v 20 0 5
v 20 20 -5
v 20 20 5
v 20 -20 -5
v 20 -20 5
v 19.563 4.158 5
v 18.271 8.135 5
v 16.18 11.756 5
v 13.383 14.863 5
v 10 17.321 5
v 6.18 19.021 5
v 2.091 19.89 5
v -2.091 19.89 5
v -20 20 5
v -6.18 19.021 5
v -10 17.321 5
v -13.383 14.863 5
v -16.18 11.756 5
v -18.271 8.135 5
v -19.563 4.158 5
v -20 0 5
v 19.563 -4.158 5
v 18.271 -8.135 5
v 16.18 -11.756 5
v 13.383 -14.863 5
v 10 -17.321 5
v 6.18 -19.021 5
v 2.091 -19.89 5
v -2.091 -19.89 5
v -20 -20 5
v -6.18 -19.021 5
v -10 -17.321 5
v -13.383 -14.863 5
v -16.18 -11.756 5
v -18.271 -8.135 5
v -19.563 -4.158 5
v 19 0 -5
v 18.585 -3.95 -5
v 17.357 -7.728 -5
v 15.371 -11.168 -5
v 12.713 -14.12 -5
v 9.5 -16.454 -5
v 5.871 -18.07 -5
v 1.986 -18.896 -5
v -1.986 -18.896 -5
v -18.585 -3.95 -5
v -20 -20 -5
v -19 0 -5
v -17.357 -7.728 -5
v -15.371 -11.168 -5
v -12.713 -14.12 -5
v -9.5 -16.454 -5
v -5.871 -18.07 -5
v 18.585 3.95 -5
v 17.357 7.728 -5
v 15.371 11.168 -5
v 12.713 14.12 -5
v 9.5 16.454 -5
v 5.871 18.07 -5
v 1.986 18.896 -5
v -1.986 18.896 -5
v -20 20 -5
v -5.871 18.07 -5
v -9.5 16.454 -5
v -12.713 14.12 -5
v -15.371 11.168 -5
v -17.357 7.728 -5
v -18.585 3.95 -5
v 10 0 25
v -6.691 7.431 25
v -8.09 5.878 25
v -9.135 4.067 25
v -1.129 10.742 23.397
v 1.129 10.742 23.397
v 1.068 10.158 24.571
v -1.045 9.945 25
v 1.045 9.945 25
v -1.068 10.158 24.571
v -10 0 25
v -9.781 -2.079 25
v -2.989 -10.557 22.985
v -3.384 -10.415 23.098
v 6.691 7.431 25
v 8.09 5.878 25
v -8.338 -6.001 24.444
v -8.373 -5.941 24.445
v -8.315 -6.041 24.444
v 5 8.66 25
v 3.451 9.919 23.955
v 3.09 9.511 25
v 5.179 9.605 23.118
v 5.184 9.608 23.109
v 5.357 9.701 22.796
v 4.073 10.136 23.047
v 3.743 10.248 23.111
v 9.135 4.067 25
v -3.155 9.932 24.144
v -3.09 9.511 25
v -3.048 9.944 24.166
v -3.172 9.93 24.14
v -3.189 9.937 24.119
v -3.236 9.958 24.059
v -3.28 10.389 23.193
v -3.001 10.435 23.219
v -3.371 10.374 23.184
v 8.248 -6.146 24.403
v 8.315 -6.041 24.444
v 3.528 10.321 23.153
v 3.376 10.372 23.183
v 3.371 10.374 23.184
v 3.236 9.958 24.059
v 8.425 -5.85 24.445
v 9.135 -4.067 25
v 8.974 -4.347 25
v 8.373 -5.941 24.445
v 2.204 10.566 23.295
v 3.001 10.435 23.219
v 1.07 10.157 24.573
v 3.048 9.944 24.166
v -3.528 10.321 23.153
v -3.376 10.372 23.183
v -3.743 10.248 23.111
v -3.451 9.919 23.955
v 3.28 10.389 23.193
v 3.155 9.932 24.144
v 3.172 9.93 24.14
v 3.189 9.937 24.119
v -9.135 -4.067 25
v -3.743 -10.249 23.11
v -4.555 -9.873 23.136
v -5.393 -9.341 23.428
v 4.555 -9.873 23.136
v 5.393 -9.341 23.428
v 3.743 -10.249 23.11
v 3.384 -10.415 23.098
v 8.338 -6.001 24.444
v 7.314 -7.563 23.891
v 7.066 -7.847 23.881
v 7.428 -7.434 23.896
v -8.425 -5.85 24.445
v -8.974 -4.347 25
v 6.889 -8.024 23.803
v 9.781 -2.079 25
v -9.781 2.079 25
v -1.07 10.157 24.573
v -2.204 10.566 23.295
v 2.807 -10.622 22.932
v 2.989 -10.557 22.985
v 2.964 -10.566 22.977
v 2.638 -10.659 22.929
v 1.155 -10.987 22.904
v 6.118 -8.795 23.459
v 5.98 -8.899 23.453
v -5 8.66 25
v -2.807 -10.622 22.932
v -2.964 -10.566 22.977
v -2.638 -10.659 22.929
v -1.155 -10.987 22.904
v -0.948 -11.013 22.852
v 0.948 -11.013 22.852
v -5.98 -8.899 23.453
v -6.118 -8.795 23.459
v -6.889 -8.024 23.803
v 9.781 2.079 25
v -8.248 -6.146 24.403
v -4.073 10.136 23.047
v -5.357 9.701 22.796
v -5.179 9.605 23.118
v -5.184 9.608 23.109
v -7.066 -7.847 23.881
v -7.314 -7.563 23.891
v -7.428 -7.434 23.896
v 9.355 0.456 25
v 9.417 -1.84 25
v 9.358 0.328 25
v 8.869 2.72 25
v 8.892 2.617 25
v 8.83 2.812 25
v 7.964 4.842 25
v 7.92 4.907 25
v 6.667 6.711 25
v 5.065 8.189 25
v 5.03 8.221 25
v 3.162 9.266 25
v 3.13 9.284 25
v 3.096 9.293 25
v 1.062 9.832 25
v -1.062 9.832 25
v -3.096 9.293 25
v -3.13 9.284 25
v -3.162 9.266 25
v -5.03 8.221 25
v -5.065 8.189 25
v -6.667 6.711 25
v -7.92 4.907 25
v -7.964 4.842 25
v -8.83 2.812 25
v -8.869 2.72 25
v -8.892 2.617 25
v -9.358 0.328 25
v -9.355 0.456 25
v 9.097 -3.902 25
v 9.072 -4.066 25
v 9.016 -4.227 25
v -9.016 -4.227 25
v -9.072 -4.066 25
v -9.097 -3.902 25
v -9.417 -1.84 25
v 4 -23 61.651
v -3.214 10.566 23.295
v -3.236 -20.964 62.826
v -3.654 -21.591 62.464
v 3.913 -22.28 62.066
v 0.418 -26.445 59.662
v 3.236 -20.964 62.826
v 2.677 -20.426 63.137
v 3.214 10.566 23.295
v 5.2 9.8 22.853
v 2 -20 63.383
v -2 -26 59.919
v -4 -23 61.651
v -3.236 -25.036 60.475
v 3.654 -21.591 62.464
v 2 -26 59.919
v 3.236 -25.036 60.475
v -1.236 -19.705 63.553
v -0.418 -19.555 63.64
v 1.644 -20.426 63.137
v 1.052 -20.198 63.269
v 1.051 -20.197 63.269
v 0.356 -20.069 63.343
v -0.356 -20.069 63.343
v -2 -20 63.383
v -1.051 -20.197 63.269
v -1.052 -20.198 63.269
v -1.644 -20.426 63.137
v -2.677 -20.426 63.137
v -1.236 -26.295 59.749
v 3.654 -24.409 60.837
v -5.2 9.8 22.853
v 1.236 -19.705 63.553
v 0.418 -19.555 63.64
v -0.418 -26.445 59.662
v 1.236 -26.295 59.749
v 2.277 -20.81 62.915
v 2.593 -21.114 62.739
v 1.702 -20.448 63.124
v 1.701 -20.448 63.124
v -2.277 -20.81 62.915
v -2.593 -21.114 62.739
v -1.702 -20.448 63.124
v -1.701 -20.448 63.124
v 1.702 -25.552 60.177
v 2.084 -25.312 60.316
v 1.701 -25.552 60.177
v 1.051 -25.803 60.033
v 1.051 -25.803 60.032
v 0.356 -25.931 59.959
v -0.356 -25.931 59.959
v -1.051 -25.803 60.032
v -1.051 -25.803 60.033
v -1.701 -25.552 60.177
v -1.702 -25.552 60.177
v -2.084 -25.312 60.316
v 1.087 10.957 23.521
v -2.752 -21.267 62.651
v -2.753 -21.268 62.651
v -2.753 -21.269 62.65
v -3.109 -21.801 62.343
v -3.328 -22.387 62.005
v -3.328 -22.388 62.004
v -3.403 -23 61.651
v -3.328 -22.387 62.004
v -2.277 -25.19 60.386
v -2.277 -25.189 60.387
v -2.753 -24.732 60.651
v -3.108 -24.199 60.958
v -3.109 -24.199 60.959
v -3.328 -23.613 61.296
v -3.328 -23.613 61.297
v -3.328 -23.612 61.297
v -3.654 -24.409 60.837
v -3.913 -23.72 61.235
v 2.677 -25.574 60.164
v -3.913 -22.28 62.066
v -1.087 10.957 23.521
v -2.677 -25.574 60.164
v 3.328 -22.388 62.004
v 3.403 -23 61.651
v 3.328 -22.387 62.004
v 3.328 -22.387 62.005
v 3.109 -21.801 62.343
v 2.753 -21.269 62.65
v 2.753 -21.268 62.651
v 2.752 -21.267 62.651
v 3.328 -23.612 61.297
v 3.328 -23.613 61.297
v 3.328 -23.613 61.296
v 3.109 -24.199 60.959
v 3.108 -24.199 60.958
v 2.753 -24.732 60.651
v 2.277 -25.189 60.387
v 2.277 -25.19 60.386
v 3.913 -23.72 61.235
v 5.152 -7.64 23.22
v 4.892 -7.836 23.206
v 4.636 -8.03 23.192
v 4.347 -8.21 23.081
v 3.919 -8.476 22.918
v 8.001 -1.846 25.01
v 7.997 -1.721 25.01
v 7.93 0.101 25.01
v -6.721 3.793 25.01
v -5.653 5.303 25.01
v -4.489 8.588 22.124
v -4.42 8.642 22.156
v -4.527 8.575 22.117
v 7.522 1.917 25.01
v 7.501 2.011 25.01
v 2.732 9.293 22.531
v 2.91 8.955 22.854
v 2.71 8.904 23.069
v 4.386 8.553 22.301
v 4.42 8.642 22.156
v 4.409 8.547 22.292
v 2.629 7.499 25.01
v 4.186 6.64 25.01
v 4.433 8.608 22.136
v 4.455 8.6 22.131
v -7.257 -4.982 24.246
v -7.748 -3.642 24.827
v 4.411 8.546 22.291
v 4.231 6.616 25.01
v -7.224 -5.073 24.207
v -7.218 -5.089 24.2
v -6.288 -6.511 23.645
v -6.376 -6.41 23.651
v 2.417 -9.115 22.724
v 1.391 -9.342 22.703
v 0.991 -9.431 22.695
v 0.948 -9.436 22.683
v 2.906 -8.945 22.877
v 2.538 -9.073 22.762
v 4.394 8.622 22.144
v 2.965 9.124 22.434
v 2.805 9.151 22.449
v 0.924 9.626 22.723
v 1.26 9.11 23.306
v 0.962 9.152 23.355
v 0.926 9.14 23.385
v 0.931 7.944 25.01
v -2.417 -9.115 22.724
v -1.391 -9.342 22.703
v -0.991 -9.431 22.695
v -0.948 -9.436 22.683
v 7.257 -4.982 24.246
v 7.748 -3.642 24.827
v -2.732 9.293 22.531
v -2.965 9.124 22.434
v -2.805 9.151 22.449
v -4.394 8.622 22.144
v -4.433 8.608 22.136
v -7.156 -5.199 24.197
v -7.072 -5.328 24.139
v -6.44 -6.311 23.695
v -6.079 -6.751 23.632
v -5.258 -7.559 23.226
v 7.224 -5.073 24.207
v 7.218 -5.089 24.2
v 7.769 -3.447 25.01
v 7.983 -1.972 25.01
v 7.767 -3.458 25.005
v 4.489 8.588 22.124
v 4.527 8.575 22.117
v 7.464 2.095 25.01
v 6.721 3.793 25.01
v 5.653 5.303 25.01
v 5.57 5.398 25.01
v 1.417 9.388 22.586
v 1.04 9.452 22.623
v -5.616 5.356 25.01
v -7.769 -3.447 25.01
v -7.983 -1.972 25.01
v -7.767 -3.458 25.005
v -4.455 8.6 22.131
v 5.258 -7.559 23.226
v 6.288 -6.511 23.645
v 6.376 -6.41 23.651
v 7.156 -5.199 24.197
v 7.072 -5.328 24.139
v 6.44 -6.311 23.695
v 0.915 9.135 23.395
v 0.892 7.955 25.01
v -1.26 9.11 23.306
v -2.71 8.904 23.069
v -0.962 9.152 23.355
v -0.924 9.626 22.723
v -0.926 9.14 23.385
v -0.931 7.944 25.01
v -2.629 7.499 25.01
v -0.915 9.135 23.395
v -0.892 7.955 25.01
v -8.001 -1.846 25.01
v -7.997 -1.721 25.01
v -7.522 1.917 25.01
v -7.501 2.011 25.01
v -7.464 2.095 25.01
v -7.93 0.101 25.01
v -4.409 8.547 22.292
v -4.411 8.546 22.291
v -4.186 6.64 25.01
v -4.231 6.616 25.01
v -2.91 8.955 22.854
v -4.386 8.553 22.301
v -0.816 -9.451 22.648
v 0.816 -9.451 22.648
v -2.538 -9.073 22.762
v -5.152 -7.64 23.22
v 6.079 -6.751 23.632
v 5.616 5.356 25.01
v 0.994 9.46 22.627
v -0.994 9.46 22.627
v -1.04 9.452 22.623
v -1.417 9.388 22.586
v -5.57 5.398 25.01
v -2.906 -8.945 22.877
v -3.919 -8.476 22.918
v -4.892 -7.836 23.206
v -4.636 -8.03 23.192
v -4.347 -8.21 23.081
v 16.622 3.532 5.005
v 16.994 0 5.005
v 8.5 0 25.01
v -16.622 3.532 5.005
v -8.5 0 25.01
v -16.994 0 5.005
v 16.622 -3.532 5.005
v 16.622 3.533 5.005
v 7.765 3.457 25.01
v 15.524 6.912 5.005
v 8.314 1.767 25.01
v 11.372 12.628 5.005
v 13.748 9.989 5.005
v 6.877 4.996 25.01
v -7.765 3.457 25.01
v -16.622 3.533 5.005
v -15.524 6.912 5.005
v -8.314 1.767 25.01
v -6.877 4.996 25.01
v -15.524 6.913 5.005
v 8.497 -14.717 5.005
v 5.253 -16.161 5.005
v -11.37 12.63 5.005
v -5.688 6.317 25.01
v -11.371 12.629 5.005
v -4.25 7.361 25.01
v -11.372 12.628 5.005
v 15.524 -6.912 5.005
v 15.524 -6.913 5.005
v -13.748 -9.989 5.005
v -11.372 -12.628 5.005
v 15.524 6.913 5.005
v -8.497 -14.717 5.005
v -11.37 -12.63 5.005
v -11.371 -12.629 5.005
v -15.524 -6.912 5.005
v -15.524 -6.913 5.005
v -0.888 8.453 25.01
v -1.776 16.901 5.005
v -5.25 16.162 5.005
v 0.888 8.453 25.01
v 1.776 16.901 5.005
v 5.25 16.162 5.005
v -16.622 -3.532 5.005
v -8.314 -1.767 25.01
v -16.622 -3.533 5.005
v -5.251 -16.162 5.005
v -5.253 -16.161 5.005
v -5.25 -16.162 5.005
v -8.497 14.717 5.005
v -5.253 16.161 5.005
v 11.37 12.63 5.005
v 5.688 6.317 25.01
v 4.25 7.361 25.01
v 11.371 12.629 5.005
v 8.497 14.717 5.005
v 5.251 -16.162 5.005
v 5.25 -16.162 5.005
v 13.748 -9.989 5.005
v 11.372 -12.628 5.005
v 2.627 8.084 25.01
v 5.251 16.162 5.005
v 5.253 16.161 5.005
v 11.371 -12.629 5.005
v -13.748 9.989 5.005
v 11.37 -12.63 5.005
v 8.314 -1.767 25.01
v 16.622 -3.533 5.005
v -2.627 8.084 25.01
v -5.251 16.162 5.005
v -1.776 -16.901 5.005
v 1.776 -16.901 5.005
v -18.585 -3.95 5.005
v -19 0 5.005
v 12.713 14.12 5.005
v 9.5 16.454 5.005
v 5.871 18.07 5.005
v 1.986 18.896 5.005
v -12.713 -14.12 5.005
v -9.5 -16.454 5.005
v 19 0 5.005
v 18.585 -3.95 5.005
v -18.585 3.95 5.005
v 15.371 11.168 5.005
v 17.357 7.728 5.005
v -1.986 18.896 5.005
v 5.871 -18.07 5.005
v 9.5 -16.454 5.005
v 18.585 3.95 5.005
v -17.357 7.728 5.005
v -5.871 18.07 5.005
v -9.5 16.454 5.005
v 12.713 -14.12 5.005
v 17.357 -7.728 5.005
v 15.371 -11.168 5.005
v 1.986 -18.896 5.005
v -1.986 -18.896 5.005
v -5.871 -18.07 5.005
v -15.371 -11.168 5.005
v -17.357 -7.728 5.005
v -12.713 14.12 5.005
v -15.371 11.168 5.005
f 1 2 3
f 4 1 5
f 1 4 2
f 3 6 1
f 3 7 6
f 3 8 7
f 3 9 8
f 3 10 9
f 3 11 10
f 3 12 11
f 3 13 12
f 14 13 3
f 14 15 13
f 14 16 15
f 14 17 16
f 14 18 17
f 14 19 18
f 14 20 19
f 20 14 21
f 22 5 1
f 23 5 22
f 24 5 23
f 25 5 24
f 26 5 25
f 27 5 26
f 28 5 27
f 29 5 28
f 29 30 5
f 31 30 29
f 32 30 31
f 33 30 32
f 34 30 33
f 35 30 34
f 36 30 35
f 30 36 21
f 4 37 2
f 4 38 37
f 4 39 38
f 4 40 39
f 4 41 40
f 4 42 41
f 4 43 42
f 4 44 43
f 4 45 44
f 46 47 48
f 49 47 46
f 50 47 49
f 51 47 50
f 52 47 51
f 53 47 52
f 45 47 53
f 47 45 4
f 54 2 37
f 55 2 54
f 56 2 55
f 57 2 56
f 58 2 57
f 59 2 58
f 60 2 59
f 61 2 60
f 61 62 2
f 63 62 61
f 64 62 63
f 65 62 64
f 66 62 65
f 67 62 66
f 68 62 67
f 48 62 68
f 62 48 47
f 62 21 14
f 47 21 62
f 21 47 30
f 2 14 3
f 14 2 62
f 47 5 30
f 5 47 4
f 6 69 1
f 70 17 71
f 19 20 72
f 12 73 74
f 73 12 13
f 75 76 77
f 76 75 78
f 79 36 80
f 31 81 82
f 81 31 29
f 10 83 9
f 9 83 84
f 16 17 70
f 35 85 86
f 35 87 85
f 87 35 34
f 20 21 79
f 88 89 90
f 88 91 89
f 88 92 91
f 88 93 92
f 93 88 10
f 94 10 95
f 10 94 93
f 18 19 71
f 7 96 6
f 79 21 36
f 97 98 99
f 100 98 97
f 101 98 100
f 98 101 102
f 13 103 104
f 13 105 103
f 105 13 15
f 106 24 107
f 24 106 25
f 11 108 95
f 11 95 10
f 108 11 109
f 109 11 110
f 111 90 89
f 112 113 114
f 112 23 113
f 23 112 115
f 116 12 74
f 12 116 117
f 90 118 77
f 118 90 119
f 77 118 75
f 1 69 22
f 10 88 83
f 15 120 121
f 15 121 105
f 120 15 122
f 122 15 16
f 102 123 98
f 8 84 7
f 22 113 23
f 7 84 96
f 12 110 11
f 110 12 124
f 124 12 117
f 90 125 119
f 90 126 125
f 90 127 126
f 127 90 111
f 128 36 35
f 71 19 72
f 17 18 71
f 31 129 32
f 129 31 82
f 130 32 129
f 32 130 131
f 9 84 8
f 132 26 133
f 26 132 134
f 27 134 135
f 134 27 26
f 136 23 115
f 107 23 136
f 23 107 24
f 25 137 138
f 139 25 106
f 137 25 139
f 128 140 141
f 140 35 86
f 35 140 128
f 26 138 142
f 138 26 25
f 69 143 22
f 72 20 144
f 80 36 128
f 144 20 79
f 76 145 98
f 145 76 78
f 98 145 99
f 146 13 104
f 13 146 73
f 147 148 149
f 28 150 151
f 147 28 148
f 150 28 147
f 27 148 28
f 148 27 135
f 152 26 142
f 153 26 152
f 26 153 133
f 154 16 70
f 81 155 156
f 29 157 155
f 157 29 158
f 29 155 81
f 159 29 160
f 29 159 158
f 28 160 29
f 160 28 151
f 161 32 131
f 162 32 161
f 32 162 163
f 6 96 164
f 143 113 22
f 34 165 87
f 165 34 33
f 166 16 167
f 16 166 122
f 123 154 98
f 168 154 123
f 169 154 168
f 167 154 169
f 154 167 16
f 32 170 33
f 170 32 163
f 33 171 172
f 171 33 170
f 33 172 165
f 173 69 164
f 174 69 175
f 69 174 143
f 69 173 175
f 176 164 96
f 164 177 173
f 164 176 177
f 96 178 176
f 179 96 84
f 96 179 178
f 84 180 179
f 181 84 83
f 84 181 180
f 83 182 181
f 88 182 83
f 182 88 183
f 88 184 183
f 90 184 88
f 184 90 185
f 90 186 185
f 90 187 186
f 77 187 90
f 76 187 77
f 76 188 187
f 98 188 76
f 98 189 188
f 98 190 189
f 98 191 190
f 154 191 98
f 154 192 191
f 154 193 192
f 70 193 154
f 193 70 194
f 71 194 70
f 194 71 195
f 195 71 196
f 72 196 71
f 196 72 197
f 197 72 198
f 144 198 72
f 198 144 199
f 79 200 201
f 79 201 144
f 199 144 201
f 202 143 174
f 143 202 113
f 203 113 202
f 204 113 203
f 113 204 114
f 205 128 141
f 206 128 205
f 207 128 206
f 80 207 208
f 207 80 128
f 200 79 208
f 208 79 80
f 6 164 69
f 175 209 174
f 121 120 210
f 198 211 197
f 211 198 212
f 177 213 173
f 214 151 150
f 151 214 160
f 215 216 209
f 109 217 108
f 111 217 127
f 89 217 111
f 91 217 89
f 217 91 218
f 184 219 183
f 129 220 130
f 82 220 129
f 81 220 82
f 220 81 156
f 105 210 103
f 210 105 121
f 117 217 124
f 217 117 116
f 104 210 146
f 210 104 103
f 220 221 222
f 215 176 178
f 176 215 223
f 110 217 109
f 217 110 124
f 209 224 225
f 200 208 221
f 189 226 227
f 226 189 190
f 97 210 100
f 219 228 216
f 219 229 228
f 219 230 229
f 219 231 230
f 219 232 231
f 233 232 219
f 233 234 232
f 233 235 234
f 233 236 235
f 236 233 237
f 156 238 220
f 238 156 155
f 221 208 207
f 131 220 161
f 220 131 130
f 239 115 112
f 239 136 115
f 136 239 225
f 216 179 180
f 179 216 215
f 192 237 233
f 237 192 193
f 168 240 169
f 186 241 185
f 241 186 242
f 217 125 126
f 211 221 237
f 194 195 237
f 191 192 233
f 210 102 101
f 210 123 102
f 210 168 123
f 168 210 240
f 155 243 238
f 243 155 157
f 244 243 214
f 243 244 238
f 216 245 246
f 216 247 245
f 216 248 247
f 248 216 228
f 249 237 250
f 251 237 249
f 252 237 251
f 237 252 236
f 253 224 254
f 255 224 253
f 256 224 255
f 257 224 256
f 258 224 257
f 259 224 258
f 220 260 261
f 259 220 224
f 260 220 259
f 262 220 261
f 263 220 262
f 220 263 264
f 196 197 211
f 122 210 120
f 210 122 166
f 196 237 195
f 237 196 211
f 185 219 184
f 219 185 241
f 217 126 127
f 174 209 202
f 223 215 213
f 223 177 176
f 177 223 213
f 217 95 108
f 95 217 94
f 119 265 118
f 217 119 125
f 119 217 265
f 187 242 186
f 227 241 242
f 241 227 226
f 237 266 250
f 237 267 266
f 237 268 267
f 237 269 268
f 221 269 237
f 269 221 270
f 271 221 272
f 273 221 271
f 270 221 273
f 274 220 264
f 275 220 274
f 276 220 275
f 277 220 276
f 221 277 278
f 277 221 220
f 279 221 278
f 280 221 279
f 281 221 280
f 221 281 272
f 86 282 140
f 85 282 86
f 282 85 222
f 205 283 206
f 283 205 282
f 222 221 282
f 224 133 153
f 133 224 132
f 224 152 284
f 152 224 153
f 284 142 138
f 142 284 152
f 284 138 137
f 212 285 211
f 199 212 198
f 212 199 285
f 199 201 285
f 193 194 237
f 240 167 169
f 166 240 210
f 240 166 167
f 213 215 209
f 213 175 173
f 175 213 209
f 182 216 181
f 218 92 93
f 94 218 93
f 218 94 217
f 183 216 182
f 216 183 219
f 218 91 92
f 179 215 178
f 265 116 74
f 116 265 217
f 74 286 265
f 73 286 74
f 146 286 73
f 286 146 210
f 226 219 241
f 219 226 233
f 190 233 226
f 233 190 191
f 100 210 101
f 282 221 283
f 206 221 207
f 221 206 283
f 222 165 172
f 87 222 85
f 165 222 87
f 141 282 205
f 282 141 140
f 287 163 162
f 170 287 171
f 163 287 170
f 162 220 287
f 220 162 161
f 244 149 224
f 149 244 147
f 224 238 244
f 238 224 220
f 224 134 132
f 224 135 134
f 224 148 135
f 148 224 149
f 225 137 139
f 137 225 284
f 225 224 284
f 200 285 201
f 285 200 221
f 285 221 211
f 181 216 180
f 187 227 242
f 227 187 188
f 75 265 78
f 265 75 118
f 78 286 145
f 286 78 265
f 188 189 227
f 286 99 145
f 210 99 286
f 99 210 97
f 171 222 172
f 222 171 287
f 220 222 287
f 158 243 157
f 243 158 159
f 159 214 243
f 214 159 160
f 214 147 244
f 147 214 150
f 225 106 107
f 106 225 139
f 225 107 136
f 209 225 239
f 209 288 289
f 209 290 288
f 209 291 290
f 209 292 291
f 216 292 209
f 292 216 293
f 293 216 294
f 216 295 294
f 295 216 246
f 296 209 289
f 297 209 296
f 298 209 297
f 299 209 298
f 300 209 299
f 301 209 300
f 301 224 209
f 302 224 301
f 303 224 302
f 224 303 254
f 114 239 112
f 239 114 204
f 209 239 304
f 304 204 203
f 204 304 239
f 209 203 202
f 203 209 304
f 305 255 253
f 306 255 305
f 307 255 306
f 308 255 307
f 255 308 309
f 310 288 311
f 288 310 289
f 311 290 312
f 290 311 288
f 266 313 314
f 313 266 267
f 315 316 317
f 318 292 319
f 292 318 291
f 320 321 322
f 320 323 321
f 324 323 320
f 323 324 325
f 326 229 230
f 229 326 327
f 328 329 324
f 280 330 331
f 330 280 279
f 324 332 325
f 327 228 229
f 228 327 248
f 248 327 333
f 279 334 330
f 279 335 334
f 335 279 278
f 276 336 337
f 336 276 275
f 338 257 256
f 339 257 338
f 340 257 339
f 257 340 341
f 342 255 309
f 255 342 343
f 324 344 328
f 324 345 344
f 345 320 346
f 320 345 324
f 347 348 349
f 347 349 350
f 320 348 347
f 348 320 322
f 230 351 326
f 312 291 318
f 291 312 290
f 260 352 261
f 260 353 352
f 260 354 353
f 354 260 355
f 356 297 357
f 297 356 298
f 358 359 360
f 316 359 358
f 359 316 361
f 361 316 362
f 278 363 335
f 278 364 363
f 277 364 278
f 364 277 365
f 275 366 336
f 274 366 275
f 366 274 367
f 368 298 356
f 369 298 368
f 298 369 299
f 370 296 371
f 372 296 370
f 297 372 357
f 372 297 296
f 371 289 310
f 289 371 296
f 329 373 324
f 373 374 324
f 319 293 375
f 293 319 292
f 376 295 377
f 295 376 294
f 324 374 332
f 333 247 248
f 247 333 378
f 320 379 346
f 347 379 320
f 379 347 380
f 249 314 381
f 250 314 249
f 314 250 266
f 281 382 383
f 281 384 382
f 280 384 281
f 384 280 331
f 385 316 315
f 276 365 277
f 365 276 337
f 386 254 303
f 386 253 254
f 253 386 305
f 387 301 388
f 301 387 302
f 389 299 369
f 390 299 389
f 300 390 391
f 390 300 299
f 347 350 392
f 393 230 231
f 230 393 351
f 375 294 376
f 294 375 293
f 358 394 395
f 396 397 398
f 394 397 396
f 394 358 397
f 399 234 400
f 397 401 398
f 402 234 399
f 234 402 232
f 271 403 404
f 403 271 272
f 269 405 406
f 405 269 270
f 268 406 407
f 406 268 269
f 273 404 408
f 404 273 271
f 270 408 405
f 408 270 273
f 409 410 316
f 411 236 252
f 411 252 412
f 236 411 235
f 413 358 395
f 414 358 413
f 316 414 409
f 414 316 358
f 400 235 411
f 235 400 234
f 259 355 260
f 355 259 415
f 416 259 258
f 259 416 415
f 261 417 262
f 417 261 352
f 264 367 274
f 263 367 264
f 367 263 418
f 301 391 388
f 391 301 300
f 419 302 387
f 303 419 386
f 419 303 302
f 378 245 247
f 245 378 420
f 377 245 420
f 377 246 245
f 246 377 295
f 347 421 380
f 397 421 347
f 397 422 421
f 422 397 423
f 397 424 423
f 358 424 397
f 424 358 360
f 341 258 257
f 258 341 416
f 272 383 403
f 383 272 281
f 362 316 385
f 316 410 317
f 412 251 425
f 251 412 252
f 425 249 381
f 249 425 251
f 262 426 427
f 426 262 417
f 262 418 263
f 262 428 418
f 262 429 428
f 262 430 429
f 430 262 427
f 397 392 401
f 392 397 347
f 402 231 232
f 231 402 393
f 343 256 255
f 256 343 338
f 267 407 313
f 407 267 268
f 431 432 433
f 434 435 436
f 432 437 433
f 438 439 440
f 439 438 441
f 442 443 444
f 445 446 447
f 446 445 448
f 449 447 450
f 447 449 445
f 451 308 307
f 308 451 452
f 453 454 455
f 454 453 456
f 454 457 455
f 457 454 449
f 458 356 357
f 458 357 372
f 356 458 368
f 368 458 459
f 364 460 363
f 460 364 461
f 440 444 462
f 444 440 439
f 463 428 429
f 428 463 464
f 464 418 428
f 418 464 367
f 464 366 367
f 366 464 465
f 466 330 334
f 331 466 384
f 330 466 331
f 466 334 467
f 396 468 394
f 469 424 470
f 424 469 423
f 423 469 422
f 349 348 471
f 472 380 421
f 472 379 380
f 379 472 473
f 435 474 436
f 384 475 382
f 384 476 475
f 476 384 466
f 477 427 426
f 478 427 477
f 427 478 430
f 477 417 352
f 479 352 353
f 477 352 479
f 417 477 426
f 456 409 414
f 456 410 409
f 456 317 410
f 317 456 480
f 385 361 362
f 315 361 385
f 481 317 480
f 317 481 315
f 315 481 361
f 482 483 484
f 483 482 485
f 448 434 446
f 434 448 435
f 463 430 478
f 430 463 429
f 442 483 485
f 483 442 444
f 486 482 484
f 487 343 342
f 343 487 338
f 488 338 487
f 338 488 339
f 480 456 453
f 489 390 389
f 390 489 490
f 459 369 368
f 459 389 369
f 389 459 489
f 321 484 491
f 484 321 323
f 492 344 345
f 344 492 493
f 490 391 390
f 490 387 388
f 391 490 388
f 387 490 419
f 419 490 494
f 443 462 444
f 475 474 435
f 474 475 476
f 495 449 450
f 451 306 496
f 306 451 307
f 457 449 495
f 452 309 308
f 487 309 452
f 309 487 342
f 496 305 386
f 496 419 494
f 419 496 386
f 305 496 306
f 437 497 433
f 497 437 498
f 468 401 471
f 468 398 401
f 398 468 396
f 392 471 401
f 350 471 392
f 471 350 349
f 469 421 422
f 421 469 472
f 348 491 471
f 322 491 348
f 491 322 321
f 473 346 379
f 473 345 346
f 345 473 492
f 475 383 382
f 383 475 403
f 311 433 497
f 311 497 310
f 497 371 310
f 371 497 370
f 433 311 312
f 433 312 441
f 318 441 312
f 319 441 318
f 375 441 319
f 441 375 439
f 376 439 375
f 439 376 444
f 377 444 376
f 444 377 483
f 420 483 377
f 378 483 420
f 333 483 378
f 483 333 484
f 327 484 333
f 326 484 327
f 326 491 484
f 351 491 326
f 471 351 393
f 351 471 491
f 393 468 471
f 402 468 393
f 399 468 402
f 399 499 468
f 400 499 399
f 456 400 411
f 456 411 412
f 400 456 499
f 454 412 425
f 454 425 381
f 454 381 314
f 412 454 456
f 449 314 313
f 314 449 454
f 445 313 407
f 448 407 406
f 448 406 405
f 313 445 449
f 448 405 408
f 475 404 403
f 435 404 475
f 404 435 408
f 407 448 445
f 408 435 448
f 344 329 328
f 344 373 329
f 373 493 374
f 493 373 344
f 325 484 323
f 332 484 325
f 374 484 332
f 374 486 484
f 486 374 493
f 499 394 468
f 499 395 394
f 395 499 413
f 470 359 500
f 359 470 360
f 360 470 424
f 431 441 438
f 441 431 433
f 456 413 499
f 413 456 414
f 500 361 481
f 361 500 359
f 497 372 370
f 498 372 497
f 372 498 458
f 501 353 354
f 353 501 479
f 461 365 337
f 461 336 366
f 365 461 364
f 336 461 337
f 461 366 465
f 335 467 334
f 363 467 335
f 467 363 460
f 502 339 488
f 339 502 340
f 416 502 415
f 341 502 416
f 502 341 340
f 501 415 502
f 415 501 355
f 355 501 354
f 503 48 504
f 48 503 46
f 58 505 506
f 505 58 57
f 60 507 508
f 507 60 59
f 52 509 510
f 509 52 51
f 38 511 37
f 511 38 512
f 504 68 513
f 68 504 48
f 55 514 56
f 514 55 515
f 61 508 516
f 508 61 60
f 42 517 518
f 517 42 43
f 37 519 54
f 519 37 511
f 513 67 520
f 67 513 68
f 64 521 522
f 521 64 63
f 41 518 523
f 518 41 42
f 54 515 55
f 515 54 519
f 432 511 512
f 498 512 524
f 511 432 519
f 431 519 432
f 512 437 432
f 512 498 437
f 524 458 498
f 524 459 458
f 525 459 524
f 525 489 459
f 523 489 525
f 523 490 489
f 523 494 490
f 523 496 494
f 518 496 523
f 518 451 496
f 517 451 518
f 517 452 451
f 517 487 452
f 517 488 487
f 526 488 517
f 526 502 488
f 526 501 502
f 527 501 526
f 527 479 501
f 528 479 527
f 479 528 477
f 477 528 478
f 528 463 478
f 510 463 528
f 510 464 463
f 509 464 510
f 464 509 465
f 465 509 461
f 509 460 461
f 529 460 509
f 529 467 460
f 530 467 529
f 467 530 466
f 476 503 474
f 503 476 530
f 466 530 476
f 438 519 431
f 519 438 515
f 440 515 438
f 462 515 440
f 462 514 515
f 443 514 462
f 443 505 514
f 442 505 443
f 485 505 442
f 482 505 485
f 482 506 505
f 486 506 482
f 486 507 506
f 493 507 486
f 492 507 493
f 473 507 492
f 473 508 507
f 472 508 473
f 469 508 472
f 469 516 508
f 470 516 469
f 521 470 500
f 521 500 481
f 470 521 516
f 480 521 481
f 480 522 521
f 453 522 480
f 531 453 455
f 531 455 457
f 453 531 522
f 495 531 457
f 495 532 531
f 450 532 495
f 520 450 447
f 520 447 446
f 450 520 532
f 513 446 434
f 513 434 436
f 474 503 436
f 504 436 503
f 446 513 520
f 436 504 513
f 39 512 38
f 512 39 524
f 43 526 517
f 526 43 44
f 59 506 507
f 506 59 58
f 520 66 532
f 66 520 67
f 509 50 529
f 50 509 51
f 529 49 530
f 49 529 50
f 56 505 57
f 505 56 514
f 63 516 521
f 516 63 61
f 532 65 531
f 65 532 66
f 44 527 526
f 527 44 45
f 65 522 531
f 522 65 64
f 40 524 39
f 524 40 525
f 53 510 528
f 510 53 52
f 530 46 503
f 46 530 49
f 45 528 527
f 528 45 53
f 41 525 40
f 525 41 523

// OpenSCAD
difference(){
union()
{
    cube([40, 40, 10], center=true);
    translate([0,0,15]) 
        cylinder(h=20, r1=20, r2=10, center=true);
    translate([0,-10.5,40])
        rotate([30,0,0])
            cylinder(h=50, r1=10.4, r2=4, center=true);
}
translate([0,-10.5,40])
    rotate([30,0,0])
        scale([0.85, 0.85, 1.001])
            cylinder(h=50, r1=10.4, r2=4, center=true);
    translate([0,0,15])
        scale([0.85, 0.85, 1.001])
            cylinder(h=20, r1=20, r2=10, center=true);

    cylinder(h=10.01, r=19, center=true);
        
}
